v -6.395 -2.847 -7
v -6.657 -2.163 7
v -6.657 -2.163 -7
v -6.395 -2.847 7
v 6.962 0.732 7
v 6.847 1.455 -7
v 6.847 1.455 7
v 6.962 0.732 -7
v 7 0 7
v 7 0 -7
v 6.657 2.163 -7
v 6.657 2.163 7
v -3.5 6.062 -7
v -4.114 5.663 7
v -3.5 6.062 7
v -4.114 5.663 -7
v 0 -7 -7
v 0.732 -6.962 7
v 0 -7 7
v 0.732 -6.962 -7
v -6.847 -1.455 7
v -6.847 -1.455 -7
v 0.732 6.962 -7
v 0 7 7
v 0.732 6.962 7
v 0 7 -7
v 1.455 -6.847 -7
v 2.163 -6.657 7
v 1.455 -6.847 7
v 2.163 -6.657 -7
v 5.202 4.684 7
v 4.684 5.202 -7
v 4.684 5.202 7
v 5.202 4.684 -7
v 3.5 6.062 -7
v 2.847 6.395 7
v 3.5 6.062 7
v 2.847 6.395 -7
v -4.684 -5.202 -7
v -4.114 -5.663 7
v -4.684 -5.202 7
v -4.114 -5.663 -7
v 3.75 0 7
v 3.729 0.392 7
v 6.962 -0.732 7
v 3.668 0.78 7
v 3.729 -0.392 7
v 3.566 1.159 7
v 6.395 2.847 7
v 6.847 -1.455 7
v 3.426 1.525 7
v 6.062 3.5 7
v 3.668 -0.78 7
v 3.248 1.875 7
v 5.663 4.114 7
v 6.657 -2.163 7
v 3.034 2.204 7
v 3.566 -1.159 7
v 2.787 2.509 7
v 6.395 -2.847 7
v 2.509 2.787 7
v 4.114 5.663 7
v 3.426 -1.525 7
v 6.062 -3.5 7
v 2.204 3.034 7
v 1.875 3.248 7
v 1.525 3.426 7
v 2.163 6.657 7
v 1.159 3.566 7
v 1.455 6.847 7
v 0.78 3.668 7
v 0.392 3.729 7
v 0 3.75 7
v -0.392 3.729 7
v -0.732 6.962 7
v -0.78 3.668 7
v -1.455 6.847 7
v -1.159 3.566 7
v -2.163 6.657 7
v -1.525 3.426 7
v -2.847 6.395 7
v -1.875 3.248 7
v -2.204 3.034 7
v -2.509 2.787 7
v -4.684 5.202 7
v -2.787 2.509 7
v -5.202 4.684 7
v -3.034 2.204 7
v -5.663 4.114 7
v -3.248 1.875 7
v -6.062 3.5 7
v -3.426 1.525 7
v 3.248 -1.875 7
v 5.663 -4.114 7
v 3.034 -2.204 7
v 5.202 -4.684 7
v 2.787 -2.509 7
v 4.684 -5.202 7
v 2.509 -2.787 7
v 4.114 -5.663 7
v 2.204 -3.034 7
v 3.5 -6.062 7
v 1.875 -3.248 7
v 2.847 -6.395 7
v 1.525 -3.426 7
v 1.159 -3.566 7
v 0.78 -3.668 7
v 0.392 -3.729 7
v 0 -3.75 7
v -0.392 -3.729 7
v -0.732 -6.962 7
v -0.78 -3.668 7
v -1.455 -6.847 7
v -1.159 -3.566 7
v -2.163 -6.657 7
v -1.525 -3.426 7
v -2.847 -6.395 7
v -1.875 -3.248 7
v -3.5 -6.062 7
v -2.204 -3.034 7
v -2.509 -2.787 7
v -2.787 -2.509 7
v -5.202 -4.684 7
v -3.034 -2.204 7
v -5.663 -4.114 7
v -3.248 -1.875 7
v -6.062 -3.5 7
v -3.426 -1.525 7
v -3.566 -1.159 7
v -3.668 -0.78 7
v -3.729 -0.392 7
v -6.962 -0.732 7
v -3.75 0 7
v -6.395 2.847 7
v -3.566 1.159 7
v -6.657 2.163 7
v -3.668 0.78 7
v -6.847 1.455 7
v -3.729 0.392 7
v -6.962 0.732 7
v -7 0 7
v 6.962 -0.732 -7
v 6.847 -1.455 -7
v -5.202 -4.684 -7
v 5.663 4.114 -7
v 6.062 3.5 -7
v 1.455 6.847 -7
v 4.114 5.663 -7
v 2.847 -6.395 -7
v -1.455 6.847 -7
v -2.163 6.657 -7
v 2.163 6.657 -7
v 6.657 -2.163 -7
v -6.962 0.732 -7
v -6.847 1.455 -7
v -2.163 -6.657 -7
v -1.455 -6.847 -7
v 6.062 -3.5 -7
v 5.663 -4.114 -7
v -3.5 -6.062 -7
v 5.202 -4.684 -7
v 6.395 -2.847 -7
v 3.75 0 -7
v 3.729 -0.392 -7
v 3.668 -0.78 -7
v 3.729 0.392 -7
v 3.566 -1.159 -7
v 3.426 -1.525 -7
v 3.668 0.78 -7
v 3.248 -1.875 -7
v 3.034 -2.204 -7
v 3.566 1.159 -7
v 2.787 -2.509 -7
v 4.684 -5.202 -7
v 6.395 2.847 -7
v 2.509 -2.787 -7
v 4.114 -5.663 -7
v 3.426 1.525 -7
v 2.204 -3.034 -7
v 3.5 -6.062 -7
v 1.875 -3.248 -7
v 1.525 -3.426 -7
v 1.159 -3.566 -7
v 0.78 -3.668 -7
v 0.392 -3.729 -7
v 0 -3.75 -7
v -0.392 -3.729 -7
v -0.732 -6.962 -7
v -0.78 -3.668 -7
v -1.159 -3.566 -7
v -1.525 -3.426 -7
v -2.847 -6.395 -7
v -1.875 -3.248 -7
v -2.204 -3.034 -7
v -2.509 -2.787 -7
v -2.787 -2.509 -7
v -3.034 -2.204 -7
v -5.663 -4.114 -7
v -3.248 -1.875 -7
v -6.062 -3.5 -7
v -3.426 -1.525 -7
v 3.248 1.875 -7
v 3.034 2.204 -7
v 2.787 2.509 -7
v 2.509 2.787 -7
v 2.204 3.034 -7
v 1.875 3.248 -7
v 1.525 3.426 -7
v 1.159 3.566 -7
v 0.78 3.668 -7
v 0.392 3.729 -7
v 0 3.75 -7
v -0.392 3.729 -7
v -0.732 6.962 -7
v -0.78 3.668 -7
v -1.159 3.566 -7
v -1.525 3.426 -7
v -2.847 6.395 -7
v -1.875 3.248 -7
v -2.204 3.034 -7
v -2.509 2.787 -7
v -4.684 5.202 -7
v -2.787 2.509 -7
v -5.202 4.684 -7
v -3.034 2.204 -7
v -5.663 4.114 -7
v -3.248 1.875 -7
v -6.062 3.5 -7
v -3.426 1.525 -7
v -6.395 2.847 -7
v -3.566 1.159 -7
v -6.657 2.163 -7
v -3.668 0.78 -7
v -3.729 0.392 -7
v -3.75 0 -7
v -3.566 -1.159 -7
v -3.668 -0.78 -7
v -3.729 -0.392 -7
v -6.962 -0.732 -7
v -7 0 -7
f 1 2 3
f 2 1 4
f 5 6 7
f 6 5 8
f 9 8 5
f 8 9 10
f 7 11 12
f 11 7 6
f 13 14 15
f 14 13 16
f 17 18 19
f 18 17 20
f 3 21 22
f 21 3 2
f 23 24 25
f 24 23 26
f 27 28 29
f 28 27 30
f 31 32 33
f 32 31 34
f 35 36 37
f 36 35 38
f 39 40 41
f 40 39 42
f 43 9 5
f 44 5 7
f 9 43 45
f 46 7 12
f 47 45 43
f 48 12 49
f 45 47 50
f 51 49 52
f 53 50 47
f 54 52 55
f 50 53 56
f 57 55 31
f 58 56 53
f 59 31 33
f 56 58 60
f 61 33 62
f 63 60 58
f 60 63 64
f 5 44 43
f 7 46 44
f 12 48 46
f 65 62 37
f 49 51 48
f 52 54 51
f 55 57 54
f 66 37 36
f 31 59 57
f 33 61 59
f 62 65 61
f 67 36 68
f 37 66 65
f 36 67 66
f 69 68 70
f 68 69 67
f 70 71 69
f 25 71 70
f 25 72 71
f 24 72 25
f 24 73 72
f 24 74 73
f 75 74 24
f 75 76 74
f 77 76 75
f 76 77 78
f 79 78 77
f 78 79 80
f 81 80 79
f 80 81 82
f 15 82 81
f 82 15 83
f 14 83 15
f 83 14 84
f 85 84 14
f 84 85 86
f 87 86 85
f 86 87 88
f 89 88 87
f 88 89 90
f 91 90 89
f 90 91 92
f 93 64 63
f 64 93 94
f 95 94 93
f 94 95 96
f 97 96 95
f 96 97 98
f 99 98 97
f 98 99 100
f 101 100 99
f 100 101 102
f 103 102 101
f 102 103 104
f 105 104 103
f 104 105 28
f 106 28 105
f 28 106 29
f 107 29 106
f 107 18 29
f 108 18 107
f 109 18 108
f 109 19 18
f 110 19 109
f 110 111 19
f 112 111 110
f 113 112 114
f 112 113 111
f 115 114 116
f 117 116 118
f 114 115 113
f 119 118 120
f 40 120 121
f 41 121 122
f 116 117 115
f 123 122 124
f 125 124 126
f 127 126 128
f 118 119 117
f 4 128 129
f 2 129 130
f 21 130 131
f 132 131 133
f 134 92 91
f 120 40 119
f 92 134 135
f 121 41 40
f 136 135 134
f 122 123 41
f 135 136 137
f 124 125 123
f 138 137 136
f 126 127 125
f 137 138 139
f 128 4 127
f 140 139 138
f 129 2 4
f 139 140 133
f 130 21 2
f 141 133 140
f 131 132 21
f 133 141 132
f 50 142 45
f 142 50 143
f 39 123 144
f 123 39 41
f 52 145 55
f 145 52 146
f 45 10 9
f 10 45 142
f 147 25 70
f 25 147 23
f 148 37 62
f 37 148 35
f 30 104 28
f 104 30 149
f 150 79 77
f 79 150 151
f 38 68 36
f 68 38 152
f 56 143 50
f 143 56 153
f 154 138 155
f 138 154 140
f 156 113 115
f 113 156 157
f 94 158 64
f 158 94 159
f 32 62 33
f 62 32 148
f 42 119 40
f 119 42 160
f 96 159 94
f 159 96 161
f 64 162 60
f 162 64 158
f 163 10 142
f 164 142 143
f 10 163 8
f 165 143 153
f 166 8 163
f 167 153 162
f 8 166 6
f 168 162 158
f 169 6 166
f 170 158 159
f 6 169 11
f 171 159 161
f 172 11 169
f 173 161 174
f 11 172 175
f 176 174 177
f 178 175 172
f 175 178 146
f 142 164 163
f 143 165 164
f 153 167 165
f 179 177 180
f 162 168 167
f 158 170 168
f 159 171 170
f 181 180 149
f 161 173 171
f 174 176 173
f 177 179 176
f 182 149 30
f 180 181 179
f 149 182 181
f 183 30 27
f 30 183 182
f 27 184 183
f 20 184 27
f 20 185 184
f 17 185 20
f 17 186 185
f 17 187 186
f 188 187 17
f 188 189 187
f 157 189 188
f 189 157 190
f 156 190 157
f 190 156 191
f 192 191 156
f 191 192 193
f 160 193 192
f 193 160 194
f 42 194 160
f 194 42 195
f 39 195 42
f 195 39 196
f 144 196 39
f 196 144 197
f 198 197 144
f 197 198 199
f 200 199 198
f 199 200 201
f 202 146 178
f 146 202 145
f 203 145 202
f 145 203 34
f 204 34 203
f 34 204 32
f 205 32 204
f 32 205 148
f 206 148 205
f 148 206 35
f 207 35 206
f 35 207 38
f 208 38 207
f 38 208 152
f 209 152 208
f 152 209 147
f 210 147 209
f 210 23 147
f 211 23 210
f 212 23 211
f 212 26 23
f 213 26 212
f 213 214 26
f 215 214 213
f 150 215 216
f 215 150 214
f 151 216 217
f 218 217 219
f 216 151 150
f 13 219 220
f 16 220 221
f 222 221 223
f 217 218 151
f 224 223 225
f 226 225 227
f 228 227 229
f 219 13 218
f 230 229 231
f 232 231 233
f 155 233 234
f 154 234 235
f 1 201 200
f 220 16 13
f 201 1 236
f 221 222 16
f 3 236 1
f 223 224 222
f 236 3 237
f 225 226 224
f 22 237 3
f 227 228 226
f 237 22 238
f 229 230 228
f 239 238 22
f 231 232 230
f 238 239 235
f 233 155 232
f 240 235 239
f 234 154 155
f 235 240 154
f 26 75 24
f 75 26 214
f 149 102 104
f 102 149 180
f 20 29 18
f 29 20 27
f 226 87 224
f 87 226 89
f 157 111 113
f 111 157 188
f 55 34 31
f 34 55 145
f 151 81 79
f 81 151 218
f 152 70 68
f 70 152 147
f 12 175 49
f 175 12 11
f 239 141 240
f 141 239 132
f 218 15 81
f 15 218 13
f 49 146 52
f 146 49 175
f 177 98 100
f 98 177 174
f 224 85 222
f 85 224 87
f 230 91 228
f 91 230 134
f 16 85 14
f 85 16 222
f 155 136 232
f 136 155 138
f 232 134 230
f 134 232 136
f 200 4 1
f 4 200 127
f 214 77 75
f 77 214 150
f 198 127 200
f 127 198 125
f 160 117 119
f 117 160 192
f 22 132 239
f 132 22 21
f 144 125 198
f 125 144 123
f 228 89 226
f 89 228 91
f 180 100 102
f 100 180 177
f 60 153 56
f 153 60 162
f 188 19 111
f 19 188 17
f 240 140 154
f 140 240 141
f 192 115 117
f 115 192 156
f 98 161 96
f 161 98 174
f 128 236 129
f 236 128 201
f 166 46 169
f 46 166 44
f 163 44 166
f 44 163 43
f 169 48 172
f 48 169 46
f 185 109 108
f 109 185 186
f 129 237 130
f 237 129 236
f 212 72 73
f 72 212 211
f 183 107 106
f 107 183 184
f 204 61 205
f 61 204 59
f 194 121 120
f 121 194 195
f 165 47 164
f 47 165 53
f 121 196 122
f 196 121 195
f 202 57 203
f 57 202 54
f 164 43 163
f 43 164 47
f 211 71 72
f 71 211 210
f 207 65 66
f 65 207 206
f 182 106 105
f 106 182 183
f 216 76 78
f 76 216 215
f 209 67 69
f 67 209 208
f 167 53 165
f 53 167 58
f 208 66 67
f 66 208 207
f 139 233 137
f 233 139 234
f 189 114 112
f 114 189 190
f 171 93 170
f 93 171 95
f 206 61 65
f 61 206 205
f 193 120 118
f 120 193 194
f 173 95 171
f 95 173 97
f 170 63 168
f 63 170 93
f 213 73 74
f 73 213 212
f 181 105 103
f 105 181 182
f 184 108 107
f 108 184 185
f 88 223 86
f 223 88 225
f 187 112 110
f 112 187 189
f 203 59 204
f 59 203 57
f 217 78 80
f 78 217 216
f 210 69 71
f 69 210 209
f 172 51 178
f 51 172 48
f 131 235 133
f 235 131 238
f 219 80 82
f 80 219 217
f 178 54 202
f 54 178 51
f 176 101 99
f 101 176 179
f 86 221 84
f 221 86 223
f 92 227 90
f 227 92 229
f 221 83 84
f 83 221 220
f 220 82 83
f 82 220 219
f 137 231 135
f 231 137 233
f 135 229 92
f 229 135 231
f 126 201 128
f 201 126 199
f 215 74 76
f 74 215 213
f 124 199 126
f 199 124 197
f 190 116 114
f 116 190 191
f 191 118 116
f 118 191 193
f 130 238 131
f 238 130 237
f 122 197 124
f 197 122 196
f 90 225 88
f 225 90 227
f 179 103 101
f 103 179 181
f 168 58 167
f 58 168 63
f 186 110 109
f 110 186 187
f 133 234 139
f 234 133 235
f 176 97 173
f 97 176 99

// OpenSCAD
$fn = 60;
dia = 14;
heigth = 14;
dia_inner = 7.5;

difference () {
    cylinder(d=dia, h=heigth, center = true);
    cylinder(d=dia_inner, h=heigth+2, center = true);
}
